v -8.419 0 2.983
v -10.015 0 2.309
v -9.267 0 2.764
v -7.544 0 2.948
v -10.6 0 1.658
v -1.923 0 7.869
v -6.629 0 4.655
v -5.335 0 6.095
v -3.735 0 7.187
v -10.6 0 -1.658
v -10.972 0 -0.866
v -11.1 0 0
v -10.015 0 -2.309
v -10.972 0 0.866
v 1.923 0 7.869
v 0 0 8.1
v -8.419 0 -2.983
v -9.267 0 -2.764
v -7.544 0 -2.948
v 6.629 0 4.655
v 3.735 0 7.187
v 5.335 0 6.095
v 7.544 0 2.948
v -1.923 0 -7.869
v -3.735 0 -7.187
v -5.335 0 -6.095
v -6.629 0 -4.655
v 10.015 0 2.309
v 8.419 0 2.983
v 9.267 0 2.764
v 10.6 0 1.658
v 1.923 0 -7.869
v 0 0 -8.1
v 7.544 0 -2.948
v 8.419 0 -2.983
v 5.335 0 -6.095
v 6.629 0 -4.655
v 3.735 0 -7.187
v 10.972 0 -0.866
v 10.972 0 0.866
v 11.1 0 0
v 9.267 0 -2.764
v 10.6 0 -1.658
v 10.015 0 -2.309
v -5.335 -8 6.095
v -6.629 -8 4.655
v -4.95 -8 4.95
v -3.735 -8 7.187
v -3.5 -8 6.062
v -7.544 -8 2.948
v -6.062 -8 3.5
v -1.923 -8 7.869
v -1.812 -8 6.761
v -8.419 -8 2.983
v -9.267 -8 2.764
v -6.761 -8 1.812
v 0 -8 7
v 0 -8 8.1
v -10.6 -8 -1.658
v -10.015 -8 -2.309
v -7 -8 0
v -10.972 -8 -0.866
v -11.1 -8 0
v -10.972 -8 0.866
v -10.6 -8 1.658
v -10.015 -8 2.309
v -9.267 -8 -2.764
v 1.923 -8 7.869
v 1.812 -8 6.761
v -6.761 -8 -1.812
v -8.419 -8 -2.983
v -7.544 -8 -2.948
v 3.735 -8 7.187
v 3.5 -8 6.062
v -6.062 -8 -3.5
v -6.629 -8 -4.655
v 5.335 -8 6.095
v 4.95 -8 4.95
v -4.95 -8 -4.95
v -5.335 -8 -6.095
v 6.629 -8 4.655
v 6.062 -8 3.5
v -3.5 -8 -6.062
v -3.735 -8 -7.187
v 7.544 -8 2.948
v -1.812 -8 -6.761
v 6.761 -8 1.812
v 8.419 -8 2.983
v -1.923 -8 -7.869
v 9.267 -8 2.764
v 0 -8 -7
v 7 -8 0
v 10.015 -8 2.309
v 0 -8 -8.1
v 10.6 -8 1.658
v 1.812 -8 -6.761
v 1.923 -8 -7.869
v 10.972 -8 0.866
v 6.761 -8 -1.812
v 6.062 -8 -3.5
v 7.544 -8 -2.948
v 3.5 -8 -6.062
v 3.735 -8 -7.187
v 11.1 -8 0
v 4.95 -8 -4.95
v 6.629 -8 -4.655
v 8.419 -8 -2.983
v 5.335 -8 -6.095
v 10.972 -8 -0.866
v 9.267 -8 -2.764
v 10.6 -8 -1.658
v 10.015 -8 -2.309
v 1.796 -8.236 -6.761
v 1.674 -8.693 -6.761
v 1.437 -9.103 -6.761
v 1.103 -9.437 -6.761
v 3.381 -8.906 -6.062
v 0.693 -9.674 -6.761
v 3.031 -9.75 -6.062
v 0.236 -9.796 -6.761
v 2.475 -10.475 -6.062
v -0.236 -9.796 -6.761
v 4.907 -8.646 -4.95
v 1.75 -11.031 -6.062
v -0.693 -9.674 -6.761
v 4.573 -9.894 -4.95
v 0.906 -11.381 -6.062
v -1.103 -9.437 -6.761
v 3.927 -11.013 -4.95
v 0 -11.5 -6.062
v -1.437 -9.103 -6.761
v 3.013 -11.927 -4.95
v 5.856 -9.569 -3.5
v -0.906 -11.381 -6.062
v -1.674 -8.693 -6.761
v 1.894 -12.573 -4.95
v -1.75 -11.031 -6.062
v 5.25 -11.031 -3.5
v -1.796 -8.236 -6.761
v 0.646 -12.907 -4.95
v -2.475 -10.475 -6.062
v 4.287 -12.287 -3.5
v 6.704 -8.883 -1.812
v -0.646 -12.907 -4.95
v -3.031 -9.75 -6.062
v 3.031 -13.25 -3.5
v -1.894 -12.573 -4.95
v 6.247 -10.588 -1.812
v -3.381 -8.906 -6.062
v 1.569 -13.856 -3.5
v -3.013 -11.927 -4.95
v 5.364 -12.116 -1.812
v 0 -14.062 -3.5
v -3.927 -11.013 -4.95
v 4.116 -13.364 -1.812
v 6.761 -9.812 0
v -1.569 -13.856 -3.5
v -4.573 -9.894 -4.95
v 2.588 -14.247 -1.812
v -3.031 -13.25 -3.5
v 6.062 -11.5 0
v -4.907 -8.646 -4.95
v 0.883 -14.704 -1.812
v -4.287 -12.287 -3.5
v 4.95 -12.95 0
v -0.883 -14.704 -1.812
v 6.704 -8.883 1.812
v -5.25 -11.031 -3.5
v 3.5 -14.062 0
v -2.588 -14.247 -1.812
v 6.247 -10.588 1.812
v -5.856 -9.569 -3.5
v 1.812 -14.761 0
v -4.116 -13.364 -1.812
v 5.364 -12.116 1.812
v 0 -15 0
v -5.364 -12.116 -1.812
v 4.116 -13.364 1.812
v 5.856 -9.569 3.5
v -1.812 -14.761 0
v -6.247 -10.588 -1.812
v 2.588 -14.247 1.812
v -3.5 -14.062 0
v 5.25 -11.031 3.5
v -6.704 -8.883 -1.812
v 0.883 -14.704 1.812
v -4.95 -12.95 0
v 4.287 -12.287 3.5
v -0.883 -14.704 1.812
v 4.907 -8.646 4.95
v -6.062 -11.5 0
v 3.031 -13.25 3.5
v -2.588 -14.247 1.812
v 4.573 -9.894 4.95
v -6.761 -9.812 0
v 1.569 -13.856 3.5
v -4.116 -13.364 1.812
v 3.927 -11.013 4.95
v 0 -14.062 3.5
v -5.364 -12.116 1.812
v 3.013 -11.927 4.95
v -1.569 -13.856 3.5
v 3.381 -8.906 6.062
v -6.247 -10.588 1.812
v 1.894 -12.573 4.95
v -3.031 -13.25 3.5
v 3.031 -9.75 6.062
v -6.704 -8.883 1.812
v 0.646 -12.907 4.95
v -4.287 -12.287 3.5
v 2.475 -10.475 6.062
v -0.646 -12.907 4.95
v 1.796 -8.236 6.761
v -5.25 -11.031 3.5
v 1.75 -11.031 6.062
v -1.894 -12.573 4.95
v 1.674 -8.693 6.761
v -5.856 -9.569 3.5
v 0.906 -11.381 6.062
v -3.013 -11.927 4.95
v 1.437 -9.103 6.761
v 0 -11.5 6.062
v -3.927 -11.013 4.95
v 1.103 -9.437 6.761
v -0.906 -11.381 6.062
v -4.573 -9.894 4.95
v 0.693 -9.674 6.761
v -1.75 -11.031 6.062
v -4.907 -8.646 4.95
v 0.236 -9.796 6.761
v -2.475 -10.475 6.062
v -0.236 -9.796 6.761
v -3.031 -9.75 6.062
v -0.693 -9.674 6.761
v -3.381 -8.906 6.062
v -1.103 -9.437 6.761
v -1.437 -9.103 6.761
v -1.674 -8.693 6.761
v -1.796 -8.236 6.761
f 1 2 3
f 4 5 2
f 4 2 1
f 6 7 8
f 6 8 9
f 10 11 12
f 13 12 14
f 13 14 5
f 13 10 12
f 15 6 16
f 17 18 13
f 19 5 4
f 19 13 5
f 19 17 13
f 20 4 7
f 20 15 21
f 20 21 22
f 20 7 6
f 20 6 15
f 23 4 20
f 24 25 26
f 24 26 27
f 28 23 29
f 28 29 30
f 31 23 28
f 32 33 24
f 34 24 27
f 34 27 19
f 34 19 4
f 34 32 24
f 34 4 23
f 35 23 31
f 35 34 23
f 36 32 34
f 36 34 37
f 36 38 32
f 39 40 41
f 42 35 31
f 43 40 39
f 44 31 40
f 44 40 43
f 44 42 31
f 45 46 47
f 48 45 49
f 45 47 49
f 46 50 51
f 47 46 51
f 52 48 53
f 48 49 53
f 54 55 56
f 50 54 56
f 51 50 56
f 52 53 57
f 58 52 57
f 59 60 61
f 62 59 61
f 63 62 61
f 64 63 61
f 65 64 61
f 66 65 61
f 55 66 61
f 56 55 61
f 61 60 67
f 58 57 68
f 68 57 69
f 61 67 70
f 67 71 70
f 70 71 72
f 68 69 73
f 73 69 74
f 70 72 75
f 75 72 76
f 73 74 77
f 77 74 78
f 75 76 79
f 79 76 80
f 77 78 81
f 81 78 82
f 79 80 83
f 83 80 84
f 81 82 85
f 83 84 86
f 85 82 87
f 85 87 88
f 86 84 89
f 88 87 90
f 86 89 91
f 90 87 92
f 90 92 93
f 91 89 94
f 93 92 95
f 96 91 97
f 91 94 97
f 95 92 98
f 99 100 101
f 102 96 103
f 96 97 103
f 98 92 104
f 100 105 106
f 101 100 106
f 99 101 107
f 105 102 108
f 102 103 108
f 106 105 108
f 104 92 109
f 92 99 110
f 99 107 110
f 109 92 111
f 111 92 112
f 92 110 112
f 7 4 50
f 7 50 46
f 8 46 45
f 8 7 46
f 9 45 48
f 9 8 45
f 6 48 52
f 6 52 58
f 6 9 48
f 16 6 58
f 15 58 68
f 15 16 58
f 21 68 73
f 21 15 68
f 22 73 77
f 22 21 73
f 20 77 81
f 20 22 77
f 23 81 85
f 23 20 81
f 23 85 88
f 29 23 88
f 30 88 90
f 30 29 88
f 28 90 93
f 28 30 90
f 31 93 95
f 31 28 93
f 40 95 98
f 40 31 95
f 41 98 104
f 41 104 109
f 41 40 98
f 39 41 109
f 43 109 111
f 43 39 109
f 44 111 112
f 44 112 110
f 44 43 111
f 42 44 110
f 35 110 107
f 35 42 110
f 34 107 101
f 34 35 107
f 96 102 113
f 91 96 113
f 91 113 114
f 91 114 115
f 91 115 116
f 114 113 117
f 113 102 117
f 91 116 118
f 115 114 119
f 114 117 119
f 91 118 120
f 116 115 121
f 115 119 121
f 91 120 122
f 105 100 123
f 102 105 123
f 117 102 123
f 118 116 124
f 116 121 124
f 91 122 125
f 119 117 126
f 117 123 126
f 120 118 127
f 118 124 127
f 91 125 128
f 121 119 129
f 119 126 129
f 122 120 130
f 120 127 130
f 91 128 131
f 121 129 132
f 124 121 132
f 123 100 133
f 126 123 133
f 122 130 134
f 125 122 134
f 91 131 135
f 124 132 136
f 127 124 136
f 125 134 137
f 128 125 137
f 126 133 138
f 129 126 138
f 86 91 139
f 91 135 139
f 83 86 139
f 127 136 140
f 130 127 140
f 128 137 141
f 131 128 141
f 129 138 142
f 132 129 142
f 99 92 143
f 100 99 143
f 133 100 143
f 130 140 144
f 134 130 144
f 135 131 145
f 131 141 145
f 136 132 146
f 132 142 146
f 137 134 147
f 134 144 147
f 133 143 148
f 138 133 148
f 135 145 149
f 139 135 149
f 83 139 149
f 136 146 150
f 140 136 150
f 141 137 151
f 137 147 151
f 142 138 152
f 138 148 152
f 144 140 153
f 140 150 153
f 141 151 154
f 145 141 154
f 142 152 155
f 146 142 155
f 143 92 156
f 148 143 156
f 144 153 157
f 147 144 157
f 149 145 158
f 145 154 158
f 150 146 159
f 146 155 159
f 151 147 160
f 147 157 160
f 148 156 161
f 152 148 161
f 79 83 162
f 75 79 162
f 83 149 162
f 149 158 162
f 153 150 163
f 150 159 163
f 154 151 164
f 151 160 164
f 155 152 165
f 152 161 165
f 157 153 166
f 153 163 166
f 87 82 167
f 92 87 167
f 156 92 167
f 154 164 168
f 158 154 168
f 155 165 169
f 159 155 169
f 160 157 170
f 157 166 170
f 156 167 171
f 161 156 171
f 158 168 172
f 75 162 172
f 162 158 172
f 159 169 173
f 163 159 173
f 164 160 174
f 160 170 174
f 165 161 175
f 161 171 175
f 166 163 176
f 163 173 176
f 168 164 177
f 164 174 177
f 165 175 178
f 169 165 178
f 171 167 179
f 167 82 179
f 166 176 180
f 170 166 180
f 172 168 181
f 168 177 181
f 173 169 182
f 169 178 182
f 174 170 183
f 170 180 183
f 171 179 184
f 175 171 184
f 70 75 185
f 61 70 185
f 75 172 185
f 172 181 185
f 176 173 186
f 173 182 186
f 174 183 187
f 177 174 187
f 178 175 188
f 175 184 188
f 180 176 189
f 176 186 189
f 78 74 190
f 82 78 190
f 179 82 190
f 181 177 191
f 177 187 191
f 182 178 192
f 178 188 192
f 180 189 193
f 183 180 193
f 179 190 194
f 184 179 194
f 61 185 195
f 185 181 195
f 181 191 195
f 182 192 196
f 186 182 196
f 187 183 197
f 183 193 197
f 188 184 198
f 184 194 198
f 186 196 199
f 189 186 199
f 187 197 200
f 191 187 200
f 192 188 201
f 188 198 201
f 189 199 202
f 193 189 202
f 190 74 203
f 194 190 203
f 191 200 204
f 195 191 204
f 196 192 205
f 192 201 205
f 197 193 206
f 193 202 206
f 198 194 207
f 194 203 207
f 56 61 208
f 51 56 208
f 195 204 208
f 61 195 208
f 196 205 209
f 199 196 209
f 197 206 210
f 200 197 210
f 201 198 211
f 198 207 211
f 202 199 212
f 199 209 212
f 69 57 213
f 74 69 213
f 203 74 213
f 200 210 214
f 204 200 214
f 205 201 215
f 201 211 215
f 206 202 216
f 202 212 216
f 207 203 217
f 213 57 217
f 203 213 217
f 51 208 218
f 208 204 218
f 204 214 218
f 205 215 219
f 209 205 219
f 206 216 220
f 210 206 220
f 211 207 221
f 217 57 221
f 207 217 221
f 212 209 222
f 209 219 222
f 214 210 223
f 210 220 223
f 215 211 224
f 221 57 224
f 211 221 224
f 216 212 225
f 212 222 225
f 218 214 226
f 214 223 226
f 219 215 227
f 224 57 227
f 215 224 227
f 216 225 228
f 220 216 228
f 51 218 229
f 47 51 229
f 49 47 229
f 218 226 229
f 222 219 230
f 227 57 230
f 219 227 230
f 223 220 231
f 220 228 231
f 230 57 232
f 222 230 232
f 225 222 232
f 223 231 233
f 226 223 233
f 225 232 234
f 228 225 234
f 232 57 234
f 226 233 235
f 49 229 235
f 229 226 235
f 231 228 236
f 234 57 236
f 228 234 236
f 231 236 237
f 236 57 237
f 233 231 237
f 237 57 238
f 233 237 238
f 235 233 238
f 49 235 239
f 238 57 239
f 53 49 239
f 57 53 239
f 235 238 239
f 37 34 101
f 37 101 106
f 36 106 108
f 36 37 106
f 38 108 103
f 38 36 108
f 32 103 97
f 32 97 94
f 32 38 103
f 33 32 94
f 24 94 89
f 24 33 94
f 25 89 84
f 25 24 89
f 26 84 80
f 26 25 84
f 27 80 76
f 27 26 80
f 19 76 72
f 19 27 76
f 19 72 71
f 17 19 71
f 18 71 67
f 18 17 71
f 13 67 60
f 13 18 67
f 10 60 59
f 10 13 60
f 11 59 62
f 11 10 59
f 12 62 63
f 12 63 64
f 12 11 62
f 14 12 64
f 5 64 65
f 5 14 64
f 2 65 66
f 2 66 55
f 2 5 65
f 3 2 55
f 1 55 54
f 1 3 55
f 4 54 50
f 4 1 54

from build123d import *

# Parameters (mm, degrees)
BOSS_EXTRUDE1_DEPTH = 8


with BuildPart() as part:
    # Sketch2 → Boss-Extrude1 (new body)
    with BuildSketch(Plane(origin=(0, 0, 0), x_dir=(1, 0, 0), z_dir=(0, 1, 0))):
        with BuildLine():
            ThreePointArc((-7.544444444, -2.948110925), (0, -8.1), (7.544444444, -2.948110925))
            ThreePointArc((7.544444444, -2.948110925), (11.1, 0), (7.544444444, 2.948110925))
            ThreePointArc((7.544444444, 2.948110925), (0, 8.1), (-7.544444444, 2.948110925))
            ThreePointArc((-7.544444444, 2.948110925), (-11.1, 0), (-7.544444444, -2.948110925))
        make_face()
    extrude(amount=-BOSS_EXTRUDE1_DEPTH)

    # Sketch3 → Revolve1 (revolve)
    with BuildSketch(Plane.XZ.offset(8)):
        with BuildLine():
            Line((0, 7), (0, -7))
            ThreePointArc((0, -7), (-7, 0), (0, 7))
        make_face()
    revolve(axis=Axis((0, -8, 7), (0, 0, -1)))


solid = part.part
